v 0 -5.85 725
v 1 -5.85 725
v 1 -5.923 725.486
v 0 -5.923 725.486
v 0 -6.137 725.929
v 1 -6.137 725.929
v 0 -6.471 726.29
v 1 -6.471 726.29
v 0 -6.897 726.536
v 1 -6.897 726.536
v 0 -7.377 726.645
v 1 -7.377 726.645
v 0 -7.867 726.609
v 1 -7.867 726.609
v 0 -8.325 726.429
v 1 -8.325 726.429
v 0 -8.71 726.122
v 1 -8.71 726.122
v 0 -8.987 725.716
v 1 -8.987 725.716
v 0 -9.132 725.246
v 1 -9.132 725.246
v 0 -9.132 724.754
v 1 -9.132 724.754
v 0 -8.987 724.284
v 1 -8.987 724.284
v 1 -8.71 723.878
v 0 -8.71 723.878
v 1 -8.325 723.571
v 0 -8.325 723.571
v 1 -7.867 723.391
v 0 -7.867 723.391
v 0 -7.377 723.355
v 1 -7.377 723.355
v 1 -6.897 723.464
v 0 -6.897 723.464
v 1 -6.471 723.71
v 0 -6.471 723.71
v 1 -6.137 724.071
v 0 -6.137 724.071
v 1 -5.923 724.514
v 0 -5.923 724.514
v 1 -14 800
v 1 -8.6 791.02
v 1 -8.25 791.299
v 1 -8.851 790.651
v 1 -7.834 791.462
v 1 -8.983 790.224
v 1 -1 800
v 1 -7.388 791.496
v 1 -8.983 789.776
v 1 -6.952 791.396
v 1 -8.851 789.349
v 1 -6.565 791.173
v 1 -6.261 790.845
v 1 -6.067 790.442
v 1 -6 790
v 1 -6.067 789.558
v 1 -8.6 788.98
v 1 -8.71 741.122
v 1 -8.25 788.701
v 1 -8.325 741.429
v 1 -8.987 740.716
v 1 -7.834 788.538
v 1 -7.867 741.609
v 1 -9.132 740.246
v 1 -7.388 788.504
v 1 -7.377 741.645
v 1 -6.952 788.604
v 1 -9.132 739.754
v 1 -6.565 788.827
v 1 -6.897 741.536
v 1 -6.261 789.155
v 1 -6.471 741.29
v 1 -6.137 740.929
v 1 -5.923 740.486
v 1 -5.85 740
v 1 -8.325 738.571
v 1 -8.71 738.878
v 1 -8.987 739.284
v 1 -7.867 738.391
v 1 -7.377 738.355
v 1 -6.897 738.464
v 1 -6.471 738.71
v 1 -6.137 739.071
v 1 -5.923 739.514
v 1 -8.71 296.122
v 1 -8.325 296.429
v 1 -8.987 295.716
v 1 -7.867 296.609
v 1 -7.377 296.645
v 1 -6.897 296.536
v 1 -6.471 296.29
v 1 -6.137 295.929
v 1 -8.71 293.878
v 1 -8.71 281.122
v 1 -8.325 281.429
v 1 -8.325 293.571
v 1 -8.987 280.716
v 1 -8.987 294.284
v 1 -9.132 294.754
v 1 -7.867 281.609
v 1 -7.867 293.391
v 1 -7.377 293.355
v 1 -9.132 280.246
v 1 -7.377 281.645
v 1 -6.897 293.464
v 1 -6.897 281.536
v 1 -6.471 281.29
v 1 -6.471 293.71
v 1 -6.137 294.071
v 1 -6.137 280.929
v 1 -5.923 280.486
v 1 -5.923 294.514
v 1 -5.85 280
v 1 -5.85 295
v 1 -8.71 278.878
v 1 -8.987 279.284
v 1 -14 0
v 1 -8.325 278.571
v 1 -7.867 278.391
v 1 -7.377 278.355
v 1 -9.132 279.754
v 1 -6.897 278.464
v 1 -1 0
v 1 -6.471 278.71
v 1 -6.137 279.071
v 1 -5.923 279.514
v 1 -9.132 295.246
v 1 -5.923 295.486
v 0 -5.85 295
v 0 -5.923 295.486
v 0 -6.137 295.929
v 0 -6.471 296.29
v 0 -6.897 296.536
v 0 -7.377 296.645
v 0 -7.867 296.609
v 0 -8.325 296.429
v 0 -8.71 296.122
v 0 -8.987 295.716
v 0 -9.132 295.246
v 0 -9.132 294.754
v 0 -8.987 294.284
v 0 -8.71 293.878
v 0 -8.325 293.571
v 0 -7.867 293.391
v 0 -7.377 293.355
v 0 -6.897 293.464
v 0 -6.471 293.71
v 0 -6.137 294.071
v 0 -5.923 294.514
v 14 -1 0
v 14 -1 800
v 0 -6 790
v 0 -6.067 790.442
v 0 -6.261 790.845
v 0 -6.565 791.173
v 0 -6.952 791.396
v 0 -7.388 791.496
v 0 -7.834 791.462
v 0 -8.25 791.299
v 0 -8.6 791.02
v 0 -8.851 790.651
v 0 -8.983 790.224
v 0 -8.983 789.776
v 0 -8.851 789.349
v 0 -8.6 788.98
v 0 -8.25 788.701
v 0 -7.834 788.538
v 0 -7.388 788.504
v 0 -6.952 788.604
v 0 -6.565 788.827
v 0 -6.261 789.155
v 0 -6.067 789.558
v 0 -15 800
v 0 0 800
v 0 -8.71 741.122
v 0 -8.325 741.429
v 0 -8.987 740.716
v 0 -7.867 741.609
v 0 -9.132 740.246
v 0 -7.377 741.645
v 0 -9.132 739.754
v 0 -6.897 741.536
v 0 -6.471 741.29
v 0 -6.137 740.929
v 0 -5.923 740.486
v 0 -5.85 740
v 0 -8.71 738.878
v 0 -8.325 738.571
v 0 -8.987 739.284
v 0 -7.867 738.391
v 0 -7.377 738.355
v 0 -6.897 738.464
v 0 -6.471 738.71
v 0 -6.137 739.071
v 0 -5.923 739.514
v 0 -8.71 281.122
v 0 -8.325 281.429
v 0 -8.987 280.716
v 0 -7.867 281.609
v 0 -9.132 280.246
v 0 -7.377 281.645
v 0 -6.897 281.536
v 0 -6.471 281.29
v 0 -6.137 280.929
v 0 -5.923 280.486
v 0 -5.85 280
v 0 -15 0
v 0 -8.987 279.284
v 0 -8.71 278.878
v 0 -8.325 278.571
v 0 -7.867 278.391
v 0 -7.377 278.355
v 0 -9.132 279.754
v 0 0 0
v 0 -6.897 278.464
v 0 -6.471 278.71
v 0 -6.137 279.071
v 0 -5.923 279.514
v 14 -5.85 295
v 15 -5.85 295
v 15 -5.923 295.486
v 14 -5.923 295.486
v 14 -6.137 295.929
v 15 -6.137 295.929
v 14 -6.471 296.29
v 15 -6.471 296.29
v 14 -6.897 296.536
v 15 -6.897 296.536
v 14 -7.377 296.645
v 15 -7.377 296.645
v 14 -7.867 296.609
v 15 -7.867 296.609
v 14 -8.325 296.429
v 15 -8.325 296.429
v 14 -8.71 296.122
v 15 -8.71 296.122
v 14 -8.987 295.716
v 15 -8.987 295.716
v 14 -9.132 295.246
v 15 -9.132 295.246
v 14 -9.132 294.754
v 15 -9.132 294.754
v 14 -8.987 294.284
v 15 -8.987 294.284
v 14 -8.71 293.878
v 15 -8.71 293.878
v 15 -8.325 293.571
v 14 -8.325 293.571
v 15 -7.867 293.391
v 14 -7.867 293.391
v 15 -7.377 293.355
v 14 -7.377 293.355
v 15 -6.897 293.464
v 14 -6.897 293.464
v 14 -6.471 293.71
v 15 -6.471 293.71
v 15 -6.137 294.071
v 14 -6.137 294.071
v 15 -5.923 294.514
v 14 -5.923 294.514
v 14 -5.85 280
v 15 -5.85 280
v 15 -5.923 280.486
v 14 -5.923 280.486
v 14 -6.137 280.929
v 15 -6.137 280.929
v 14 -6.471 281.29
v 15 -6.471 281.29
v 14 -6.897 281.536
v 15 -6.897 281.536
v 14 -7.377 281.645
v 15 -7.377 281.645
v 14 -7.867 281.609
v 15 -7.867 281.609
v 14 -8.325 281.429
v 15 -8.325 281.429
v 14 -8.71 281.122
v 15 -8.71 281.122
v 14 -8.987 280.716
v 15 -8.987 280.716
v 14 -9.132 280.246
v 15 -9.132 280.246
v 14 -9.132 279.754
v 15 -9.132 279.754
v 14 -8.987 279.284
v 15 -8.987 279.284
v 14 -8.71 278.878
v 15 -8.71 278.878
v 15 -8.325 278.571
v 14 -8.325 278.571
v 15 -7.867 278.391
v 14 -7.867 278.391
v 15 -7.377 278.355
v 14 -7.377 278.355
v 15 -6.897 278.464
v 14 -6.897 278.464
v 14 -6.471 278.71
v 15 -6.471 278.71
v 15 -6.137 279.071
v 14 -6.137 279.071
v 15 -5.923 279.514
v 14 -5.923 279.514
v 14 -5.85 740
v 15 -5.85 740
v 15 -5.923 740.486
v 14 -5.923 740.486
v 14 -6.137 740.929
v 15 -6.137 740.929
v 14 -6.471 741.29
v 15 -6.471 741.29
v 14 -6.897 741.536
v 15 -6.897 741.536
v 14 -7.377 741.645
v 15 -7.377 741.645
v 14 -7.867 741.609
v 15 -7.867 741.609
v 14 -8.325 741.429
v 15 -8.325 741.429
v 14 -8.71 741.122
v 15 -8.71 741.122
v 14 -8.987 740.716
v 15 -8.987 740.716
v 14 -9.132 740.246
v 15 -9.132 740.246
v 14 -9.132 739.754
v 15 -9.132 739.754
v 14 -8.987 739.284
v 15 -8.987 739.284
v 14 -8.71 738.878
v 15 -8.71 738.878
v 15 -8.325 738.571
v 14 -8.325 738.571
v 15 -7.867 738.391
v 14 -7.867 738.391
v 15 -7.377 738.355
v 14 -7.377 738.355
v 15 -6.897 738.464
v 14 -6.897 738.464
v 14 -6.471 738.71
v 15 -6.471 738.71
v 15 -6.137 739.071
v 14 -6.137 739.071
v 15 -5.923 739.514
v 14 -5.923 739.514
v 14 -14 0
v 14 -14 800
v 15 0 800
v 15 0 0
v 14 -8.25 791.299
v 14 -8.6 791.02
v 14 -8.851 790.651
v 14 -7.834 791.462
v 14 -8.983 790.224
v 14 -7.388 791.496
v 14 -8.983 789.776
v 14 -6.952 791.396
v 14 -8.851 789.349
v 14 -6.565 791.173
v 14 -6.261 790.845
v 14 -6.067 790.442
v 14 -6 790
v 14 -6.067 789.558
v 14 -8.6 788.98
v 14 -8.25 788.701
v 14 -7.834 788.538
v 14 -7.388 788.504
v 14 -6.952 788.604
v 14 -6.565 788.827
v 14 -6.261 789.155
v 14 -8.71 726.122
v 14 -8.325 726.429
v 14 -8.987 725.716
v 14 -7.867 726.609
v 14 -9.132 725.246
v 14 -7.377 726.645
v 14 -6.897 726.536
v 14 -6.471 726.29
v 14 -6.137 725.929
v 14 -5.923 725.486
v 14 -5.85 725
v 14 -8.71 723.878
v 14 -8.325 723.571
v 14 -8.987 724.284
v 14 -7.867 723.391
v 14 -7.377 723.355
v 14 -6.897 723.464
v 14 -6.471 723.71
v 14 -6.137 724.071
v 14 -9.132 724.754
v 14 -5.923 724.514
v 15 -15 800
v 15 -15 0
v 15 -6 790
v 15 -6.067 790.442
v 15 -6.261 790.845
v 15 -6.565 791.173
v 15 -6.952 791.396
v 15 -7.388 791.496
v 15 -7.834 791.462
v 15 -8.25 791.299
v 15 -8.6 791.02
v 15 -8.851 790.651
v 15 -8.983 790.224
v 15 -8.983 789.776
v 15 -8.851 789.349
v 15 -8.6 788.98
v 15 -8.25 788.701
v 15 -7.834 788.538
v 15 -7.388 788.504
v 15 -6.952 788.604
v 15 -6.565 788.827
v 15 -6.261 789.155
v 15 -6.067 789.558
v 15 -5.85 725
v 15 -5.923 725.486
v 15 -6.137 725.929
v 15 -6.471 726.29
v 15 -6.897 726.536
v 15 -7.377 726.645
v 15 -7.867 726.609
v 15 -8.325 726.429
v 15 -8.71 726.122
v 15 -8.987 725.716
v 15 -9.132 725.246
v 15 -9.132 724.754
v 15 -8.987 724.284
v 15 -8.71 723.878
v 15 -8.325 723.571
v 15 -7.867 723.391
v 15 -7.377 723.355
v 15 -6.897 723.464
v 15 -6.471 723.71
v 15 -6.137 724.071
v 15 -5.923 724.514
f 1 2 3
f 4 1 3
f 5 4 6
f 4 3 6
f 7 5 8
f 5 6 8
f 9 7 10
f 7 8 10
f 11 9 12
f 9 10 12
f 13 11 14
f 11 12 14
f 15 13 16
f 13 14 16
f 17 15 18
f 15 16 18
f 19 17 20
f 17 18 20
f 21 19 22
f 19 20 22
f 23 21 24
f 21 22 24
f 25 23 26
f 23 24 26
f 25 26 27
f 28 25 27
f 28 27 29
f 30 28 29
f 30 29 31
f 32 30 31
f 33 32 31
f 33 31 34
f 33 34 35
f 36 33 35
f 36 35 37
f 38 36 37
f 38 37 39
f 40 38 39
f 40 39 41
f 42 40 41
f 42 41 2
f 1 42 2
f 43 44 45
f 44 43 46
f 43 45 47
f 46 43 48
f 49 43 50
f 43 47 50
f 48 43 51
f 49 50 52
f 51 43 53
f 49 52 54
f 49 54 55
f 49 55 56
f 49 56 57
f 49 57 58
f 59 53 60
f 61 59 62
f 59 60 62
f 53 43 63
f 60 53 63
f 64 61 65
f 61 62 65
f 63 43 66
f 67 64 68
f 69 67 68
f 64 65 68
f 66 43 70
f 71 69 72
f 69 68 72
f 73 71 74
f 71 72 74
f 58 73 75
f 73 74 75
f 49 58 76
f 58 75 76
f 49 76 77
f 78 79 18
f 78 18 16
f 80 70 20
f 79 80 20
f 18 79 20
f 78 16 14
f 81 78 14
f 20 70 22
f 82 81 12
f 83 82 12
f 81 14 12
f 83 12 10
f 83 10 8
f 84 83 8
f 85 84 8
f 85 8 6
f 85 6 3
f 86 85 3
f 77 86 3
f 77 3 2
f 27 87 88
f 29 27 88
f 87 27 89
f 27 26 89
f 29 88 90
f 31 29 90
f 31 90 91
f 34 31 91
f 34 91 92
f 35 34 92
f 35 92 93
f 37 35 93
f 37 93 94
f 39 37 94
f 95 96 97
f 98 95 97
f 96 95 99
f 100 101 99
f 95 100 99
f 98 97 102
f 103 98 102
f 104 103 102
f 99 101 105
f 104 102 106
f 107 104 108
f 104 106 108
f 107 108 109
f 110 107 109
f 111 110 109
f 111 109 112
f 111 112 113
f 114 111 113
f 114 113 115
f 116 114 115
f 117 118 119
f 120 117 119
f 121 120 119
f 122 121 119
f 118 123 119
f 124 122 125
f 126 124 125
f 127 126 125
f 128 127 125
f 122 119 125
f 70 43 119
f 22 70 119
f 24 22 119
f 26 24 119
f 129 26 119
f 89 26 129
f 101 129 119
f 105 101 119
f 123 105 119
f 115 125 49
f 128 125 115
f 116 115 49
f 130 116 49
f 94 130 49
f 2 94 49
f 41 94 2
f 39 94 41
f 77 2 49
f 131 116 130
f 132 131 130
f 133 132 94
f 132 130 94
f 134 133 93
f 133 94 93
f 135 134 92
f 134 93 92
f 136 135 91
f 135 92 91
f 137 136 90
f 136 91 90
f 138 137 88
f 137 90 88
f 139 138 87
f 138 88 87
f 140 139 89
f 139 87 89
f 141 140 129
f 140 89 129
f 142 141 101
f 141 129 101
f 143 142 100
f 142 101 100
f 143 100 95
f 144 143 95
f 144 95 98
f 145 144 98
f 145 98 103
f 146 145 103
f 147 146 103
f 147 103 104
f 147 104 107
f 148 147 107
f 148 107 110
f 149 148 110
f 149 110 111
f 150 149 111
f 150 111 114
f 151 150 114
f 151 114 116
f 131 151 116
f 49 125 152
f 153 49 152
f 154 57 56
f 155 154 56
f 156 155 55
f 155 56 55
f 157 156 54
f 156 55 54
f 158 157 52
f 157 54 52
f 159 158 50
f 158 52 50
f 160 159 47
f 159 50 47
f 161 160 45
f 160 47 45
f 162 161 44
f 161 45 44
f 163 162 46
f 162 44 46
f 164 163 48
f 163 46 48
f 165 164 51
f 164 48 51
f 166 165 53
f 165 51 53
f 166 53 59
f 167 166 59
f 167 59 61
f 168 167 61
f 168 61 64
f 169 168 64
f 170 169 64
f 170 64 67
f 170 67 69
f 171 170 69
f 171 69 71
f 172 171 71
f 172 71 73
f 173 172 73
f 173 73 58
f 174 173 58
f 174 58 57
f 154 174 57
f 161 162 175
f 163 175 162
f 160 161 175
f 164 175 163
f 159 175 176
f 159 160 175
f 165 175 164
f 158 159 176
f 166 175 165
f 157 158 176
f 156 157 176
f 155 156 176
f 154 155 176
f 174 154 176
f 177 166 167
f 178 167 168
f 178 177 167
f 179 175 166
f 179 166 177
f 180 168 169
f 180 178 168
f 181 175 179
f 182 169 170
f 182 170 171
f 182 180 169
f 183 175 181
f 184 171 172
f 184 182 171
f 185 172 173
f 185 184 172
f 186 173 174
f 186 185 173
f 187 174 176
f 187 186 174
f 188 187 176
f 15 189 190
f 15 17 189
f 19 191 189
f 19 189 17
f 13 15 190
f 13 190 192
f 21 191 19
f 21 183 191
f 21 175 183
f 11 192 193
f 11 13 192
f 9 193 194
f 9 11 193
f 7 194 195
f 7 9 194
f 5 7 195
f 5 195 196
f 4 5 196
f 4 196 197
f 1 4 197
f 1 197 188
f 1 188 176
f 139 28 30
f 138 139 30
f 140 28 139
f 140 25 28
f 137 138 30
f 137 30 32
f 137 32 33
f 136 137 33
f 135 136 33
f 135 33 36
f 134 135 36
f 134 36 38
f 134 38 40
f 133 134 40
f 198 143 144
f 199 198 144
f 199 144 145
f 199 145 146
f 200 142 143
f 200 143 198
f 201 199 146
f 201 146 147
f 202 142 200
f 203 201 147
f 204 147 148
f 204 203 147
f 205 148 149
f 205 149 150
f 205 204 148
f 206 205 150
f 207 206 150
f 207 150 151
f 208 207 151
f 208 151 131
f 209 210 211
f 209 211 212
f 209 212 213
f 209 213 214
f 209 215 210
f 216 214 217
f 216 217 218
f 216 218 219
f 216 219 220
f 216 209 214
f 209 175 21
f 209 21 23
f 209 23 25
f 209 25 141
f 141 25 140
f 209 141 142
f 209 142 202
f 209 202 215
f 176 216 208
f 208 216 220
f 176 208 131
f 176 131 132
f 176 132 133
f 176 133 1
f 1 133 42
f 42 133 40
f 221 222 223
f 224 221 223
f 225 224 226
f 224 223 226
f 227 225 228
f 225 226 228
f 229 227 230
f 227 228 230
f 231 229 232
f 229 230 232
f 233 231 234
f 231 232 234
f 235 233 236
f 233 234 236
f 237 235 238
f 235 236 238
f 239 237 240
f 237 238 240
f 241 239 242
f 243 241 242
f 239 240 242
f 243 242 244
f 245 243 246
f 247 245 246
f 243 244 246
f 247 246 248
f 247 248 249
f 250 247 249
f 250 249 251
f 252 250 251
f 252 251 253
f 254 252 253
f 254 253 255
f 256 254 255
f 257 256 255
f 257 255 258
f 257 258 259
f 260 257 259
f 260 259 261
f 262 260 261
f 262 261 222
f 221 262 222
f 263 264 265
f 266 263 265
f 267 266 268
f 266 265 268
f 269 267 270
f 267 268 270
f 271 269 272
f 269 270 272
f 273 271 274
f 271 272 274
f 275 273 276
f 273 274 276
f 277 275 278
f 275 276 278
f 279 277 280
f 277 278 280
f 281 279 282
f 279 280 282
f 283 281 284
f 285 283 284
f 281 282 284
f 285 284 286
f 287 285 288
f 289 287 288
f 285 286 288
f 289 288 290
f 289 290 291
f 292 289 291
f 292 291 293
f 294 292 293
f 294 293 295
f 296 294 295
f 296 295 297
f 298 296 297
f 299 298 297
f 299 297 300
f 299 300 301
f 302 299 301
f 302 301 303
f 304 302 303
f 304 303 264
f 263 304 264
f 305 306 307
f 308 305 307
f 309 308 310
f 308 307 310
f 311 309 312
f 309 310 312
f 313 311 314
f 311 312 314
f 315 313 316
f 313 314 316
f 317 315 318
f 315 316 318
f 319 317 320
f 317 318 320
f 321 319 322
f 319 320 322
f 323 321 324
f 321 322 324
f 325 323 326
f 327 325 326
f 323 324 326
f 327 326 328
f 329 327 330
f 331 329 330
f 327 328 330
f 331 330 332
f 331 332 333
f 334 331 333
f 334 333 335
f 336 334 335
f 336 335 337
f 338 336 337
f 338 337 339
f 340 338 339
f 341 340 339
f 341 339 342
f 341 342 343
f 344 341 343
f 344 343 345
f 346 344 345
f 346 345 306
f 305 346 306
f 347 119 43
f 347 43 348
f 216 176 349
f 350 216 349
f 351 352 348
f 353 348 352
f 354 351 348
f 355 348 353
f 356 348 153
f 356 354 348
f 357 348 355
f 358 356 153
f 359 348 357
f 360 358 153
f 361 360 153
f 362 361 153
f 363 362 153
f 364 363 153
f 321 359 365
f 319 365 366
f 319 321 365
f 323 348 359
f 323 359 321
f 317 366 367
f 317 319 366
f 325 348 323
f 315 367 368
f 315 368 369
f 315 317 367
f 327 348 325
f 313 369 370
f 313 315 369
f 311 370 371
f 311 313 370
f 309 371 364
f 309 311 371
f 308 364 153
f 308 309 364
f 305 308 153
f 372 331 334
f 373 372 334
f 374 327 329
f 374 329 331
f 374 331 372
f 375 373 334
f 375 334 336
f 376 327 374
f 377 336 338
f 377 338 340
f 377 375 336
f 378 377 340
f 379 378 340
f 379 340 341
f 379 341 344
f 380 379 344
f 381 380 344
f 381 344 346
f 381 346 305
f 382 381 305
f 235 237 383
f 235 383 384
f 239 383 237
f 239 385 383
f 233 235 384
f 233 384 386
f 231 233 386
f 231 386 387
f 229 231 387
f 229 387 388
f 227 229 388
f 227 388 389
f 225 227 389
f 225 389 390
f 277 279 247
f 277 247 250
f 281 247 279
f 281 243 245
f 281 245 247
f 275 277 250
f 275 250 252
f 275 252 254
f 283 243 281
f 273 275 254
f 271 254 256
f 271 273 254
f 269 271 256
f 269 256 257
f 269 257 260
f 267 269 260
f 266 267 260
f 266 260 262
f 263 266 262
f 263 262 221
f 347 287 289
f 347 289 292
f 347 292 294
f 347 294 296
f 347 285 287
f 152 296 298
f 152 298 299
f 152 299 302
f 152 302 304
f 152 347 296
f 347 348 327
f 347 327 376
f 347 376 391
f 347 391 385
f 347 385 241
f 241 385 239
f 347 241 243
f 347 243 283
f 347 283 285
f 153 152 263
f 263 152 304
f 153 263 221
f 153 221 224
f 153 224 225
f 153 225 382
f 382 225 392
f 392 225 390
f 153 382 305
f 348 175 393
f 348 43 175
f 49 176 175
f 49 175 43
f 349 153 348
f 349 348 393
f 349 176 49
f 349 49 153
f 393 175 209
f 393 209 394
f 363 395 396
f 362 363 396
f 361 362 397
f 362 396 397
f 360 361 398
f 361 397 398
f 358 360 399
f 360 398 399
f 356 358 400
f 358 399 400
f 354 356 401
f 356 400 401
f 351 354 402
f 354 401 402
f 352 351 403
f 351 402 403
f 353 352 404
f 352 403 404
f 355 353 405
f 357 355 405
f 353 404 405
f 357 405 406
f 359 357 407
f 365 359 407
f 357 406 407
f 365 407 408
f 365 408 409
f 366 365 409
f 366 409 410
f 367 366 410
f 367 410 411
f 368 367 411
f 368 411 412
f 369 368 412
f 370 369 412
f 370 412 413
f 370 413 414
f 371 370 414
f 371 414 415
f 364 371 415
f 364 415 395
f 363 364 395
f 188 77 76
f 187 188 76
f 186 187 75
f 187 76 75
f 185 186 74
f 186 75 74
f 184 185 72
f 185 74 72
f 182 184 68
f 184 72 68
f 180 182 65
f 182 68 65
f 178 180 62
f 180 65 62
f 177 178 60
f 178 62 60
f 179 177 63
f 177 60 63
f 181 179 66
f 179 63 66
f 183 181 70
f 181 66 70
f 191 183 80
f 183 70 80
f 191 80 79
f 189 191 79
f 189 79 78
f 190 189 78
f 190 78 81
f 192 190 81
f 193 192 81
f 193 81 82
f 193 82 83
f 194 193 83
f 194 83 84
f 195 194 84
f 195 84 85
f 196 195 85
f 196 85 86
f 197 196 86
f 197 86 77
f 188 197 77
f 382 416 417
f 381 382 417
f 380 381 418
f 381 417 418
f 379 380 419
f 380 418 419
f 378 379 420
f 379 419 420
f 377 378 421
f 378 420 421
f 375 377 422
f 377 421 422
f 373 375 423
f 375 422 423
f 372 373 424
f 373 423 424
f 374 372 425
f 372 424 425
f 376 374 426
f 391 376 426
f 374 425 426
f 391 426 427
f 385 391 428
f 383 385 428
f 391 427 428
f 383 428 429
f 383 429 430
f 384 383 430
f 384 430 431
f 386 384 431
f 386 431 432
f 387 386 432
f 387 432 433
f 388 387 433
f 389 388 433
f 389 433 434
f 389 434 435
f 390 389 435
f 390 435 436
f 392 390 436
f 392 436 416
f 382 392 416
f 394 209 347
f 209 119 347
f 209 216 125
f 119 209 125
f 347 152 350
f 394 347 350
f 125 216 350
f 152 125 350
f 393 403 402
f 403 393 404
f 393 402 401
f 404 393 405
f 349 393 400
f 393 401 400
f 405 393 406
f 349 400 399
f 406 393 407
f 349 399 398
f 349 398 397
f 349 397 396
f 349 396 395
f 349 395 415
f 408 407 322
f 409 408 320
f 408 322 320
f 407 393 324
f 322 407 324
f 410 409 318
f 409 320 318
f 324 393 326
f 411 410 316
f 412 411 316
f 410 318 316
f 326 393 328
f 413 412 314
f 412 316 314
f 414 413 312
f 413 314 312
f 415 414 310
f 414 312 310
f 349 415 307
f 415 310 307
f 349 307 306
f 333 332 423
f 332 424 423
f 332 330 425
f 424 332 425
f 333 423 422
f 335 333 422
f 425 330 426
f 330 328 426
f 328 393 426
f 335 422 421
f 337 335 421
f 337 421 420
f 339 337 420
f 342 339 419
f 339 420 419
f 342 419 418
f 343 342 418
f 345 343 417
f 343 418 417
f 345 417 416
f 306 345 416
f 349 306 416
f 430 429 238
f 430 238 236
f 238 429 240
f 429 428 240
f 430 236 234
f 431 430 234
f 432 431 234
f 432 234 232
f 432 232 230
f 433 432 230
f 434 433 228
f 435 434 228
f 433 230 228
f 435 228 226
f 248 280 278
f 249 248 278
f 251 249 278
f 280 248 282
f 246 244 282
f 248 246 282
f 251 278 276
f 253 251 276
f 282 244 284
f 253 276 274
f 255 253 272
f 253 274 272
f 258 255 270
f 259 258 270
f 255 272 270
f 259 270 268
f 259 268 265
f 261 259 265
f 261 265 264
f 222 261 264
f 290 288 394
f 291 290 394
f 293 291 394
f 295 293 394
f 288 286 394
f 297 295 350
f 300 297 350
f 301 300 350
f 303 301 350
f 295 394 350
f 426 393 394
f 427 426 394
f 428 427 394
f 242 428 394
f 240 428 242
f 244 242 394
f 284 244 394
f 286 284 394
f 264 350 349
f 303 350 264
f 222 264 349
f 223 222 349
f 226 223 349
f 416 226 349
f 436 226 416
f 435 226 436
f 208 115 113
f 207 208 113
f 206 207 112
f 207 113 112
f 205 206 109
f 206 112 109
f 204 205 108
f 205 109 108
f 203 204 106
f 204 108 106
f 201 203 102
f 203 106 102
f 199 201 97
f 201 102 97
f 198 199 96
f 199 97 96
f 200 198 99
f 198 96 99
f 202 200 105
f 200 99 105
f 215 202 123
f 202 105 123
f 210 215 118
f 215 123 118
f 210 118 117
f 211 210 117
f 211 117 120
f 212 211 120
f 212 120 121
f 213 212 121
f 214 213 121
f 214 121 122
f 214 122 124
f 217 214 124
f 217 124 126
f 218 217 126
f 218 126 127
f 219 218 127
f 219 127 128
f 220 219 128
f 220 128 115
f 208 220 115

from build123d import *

# Parameters (mm, degrees)
SKETCH_1_W          = 15
SKETCH_1_H          = 15
SKETCH_1_W_2        = 13
SKETCH_1_H_2        = 13
EXTRUDE_1_DEPTH     = 800
SKETCH_4_R          = 1.5
CUT_EXTRUDE_3_DEPTH = 801.281200579
SKETCH_5_R          = 1.65
CUT_EXTRUDE_4_DEPTH = 801.281200579


with BuildPart() as part:
    # 草图1 → 拉伸-薄壁1 (new body)
    with BuildSketch(Plane.XY):
        with Locations((7.5, -7.5)):
            Rectangle(SKETCH_1_W, SKETCH_1_H)
        with Locations((7.5, -7.5)):
            Rectangle(SKETCH_1_W_2, SKETCH_1_H_2, mode=Mode.SUBTRACT)
    extrude(amount=EXTRUDE_1_DEPTH)

    # 草图4 → 切除-拉伸3 (cut, through all)
    with BuildSketch(Plane(origin=(15, 0, 0), x_dir=(0, 0, -1), z_dir=(1, 0, 0))):
        with Locations(Location((-790, -7.5, 0), (0, 0, 90))):
            Circle(SKETCH_4_R)
    extrude(amount=-CUT_EXTRUDE_3_DEPTH, mode=Mode.SUBTRACT)

    # 草图5 → 切除-拉伸4 (cut, through all)
    with BuildSketch(Plane(origin=(15, 0, 0), x_dir=(0, 0, -1), z_dir=(1, 0, 0))):
        with Locations(Location((-280, -7.5, 0), (0, 0, 90))):
            Circle(SKETCH_5_R)
        with Locations(Location((-295, -7.5, 0), (0, 0, 90))):
            Circle(SKETCH_5_R)
        with Locations(Location((-725, -7.5, 0), (0, 0, 90))):
            Circle(SKETCH_5_R)
        with Locations(Location((-740, -7.5, 0), (0, 0, 90))):
            Circle(SKETCH_5_R)
    extrude(amount=-CUT_EXTRUDE_4_DEPTH, mode=Mode.SUBTRACT)


solid = part.part
